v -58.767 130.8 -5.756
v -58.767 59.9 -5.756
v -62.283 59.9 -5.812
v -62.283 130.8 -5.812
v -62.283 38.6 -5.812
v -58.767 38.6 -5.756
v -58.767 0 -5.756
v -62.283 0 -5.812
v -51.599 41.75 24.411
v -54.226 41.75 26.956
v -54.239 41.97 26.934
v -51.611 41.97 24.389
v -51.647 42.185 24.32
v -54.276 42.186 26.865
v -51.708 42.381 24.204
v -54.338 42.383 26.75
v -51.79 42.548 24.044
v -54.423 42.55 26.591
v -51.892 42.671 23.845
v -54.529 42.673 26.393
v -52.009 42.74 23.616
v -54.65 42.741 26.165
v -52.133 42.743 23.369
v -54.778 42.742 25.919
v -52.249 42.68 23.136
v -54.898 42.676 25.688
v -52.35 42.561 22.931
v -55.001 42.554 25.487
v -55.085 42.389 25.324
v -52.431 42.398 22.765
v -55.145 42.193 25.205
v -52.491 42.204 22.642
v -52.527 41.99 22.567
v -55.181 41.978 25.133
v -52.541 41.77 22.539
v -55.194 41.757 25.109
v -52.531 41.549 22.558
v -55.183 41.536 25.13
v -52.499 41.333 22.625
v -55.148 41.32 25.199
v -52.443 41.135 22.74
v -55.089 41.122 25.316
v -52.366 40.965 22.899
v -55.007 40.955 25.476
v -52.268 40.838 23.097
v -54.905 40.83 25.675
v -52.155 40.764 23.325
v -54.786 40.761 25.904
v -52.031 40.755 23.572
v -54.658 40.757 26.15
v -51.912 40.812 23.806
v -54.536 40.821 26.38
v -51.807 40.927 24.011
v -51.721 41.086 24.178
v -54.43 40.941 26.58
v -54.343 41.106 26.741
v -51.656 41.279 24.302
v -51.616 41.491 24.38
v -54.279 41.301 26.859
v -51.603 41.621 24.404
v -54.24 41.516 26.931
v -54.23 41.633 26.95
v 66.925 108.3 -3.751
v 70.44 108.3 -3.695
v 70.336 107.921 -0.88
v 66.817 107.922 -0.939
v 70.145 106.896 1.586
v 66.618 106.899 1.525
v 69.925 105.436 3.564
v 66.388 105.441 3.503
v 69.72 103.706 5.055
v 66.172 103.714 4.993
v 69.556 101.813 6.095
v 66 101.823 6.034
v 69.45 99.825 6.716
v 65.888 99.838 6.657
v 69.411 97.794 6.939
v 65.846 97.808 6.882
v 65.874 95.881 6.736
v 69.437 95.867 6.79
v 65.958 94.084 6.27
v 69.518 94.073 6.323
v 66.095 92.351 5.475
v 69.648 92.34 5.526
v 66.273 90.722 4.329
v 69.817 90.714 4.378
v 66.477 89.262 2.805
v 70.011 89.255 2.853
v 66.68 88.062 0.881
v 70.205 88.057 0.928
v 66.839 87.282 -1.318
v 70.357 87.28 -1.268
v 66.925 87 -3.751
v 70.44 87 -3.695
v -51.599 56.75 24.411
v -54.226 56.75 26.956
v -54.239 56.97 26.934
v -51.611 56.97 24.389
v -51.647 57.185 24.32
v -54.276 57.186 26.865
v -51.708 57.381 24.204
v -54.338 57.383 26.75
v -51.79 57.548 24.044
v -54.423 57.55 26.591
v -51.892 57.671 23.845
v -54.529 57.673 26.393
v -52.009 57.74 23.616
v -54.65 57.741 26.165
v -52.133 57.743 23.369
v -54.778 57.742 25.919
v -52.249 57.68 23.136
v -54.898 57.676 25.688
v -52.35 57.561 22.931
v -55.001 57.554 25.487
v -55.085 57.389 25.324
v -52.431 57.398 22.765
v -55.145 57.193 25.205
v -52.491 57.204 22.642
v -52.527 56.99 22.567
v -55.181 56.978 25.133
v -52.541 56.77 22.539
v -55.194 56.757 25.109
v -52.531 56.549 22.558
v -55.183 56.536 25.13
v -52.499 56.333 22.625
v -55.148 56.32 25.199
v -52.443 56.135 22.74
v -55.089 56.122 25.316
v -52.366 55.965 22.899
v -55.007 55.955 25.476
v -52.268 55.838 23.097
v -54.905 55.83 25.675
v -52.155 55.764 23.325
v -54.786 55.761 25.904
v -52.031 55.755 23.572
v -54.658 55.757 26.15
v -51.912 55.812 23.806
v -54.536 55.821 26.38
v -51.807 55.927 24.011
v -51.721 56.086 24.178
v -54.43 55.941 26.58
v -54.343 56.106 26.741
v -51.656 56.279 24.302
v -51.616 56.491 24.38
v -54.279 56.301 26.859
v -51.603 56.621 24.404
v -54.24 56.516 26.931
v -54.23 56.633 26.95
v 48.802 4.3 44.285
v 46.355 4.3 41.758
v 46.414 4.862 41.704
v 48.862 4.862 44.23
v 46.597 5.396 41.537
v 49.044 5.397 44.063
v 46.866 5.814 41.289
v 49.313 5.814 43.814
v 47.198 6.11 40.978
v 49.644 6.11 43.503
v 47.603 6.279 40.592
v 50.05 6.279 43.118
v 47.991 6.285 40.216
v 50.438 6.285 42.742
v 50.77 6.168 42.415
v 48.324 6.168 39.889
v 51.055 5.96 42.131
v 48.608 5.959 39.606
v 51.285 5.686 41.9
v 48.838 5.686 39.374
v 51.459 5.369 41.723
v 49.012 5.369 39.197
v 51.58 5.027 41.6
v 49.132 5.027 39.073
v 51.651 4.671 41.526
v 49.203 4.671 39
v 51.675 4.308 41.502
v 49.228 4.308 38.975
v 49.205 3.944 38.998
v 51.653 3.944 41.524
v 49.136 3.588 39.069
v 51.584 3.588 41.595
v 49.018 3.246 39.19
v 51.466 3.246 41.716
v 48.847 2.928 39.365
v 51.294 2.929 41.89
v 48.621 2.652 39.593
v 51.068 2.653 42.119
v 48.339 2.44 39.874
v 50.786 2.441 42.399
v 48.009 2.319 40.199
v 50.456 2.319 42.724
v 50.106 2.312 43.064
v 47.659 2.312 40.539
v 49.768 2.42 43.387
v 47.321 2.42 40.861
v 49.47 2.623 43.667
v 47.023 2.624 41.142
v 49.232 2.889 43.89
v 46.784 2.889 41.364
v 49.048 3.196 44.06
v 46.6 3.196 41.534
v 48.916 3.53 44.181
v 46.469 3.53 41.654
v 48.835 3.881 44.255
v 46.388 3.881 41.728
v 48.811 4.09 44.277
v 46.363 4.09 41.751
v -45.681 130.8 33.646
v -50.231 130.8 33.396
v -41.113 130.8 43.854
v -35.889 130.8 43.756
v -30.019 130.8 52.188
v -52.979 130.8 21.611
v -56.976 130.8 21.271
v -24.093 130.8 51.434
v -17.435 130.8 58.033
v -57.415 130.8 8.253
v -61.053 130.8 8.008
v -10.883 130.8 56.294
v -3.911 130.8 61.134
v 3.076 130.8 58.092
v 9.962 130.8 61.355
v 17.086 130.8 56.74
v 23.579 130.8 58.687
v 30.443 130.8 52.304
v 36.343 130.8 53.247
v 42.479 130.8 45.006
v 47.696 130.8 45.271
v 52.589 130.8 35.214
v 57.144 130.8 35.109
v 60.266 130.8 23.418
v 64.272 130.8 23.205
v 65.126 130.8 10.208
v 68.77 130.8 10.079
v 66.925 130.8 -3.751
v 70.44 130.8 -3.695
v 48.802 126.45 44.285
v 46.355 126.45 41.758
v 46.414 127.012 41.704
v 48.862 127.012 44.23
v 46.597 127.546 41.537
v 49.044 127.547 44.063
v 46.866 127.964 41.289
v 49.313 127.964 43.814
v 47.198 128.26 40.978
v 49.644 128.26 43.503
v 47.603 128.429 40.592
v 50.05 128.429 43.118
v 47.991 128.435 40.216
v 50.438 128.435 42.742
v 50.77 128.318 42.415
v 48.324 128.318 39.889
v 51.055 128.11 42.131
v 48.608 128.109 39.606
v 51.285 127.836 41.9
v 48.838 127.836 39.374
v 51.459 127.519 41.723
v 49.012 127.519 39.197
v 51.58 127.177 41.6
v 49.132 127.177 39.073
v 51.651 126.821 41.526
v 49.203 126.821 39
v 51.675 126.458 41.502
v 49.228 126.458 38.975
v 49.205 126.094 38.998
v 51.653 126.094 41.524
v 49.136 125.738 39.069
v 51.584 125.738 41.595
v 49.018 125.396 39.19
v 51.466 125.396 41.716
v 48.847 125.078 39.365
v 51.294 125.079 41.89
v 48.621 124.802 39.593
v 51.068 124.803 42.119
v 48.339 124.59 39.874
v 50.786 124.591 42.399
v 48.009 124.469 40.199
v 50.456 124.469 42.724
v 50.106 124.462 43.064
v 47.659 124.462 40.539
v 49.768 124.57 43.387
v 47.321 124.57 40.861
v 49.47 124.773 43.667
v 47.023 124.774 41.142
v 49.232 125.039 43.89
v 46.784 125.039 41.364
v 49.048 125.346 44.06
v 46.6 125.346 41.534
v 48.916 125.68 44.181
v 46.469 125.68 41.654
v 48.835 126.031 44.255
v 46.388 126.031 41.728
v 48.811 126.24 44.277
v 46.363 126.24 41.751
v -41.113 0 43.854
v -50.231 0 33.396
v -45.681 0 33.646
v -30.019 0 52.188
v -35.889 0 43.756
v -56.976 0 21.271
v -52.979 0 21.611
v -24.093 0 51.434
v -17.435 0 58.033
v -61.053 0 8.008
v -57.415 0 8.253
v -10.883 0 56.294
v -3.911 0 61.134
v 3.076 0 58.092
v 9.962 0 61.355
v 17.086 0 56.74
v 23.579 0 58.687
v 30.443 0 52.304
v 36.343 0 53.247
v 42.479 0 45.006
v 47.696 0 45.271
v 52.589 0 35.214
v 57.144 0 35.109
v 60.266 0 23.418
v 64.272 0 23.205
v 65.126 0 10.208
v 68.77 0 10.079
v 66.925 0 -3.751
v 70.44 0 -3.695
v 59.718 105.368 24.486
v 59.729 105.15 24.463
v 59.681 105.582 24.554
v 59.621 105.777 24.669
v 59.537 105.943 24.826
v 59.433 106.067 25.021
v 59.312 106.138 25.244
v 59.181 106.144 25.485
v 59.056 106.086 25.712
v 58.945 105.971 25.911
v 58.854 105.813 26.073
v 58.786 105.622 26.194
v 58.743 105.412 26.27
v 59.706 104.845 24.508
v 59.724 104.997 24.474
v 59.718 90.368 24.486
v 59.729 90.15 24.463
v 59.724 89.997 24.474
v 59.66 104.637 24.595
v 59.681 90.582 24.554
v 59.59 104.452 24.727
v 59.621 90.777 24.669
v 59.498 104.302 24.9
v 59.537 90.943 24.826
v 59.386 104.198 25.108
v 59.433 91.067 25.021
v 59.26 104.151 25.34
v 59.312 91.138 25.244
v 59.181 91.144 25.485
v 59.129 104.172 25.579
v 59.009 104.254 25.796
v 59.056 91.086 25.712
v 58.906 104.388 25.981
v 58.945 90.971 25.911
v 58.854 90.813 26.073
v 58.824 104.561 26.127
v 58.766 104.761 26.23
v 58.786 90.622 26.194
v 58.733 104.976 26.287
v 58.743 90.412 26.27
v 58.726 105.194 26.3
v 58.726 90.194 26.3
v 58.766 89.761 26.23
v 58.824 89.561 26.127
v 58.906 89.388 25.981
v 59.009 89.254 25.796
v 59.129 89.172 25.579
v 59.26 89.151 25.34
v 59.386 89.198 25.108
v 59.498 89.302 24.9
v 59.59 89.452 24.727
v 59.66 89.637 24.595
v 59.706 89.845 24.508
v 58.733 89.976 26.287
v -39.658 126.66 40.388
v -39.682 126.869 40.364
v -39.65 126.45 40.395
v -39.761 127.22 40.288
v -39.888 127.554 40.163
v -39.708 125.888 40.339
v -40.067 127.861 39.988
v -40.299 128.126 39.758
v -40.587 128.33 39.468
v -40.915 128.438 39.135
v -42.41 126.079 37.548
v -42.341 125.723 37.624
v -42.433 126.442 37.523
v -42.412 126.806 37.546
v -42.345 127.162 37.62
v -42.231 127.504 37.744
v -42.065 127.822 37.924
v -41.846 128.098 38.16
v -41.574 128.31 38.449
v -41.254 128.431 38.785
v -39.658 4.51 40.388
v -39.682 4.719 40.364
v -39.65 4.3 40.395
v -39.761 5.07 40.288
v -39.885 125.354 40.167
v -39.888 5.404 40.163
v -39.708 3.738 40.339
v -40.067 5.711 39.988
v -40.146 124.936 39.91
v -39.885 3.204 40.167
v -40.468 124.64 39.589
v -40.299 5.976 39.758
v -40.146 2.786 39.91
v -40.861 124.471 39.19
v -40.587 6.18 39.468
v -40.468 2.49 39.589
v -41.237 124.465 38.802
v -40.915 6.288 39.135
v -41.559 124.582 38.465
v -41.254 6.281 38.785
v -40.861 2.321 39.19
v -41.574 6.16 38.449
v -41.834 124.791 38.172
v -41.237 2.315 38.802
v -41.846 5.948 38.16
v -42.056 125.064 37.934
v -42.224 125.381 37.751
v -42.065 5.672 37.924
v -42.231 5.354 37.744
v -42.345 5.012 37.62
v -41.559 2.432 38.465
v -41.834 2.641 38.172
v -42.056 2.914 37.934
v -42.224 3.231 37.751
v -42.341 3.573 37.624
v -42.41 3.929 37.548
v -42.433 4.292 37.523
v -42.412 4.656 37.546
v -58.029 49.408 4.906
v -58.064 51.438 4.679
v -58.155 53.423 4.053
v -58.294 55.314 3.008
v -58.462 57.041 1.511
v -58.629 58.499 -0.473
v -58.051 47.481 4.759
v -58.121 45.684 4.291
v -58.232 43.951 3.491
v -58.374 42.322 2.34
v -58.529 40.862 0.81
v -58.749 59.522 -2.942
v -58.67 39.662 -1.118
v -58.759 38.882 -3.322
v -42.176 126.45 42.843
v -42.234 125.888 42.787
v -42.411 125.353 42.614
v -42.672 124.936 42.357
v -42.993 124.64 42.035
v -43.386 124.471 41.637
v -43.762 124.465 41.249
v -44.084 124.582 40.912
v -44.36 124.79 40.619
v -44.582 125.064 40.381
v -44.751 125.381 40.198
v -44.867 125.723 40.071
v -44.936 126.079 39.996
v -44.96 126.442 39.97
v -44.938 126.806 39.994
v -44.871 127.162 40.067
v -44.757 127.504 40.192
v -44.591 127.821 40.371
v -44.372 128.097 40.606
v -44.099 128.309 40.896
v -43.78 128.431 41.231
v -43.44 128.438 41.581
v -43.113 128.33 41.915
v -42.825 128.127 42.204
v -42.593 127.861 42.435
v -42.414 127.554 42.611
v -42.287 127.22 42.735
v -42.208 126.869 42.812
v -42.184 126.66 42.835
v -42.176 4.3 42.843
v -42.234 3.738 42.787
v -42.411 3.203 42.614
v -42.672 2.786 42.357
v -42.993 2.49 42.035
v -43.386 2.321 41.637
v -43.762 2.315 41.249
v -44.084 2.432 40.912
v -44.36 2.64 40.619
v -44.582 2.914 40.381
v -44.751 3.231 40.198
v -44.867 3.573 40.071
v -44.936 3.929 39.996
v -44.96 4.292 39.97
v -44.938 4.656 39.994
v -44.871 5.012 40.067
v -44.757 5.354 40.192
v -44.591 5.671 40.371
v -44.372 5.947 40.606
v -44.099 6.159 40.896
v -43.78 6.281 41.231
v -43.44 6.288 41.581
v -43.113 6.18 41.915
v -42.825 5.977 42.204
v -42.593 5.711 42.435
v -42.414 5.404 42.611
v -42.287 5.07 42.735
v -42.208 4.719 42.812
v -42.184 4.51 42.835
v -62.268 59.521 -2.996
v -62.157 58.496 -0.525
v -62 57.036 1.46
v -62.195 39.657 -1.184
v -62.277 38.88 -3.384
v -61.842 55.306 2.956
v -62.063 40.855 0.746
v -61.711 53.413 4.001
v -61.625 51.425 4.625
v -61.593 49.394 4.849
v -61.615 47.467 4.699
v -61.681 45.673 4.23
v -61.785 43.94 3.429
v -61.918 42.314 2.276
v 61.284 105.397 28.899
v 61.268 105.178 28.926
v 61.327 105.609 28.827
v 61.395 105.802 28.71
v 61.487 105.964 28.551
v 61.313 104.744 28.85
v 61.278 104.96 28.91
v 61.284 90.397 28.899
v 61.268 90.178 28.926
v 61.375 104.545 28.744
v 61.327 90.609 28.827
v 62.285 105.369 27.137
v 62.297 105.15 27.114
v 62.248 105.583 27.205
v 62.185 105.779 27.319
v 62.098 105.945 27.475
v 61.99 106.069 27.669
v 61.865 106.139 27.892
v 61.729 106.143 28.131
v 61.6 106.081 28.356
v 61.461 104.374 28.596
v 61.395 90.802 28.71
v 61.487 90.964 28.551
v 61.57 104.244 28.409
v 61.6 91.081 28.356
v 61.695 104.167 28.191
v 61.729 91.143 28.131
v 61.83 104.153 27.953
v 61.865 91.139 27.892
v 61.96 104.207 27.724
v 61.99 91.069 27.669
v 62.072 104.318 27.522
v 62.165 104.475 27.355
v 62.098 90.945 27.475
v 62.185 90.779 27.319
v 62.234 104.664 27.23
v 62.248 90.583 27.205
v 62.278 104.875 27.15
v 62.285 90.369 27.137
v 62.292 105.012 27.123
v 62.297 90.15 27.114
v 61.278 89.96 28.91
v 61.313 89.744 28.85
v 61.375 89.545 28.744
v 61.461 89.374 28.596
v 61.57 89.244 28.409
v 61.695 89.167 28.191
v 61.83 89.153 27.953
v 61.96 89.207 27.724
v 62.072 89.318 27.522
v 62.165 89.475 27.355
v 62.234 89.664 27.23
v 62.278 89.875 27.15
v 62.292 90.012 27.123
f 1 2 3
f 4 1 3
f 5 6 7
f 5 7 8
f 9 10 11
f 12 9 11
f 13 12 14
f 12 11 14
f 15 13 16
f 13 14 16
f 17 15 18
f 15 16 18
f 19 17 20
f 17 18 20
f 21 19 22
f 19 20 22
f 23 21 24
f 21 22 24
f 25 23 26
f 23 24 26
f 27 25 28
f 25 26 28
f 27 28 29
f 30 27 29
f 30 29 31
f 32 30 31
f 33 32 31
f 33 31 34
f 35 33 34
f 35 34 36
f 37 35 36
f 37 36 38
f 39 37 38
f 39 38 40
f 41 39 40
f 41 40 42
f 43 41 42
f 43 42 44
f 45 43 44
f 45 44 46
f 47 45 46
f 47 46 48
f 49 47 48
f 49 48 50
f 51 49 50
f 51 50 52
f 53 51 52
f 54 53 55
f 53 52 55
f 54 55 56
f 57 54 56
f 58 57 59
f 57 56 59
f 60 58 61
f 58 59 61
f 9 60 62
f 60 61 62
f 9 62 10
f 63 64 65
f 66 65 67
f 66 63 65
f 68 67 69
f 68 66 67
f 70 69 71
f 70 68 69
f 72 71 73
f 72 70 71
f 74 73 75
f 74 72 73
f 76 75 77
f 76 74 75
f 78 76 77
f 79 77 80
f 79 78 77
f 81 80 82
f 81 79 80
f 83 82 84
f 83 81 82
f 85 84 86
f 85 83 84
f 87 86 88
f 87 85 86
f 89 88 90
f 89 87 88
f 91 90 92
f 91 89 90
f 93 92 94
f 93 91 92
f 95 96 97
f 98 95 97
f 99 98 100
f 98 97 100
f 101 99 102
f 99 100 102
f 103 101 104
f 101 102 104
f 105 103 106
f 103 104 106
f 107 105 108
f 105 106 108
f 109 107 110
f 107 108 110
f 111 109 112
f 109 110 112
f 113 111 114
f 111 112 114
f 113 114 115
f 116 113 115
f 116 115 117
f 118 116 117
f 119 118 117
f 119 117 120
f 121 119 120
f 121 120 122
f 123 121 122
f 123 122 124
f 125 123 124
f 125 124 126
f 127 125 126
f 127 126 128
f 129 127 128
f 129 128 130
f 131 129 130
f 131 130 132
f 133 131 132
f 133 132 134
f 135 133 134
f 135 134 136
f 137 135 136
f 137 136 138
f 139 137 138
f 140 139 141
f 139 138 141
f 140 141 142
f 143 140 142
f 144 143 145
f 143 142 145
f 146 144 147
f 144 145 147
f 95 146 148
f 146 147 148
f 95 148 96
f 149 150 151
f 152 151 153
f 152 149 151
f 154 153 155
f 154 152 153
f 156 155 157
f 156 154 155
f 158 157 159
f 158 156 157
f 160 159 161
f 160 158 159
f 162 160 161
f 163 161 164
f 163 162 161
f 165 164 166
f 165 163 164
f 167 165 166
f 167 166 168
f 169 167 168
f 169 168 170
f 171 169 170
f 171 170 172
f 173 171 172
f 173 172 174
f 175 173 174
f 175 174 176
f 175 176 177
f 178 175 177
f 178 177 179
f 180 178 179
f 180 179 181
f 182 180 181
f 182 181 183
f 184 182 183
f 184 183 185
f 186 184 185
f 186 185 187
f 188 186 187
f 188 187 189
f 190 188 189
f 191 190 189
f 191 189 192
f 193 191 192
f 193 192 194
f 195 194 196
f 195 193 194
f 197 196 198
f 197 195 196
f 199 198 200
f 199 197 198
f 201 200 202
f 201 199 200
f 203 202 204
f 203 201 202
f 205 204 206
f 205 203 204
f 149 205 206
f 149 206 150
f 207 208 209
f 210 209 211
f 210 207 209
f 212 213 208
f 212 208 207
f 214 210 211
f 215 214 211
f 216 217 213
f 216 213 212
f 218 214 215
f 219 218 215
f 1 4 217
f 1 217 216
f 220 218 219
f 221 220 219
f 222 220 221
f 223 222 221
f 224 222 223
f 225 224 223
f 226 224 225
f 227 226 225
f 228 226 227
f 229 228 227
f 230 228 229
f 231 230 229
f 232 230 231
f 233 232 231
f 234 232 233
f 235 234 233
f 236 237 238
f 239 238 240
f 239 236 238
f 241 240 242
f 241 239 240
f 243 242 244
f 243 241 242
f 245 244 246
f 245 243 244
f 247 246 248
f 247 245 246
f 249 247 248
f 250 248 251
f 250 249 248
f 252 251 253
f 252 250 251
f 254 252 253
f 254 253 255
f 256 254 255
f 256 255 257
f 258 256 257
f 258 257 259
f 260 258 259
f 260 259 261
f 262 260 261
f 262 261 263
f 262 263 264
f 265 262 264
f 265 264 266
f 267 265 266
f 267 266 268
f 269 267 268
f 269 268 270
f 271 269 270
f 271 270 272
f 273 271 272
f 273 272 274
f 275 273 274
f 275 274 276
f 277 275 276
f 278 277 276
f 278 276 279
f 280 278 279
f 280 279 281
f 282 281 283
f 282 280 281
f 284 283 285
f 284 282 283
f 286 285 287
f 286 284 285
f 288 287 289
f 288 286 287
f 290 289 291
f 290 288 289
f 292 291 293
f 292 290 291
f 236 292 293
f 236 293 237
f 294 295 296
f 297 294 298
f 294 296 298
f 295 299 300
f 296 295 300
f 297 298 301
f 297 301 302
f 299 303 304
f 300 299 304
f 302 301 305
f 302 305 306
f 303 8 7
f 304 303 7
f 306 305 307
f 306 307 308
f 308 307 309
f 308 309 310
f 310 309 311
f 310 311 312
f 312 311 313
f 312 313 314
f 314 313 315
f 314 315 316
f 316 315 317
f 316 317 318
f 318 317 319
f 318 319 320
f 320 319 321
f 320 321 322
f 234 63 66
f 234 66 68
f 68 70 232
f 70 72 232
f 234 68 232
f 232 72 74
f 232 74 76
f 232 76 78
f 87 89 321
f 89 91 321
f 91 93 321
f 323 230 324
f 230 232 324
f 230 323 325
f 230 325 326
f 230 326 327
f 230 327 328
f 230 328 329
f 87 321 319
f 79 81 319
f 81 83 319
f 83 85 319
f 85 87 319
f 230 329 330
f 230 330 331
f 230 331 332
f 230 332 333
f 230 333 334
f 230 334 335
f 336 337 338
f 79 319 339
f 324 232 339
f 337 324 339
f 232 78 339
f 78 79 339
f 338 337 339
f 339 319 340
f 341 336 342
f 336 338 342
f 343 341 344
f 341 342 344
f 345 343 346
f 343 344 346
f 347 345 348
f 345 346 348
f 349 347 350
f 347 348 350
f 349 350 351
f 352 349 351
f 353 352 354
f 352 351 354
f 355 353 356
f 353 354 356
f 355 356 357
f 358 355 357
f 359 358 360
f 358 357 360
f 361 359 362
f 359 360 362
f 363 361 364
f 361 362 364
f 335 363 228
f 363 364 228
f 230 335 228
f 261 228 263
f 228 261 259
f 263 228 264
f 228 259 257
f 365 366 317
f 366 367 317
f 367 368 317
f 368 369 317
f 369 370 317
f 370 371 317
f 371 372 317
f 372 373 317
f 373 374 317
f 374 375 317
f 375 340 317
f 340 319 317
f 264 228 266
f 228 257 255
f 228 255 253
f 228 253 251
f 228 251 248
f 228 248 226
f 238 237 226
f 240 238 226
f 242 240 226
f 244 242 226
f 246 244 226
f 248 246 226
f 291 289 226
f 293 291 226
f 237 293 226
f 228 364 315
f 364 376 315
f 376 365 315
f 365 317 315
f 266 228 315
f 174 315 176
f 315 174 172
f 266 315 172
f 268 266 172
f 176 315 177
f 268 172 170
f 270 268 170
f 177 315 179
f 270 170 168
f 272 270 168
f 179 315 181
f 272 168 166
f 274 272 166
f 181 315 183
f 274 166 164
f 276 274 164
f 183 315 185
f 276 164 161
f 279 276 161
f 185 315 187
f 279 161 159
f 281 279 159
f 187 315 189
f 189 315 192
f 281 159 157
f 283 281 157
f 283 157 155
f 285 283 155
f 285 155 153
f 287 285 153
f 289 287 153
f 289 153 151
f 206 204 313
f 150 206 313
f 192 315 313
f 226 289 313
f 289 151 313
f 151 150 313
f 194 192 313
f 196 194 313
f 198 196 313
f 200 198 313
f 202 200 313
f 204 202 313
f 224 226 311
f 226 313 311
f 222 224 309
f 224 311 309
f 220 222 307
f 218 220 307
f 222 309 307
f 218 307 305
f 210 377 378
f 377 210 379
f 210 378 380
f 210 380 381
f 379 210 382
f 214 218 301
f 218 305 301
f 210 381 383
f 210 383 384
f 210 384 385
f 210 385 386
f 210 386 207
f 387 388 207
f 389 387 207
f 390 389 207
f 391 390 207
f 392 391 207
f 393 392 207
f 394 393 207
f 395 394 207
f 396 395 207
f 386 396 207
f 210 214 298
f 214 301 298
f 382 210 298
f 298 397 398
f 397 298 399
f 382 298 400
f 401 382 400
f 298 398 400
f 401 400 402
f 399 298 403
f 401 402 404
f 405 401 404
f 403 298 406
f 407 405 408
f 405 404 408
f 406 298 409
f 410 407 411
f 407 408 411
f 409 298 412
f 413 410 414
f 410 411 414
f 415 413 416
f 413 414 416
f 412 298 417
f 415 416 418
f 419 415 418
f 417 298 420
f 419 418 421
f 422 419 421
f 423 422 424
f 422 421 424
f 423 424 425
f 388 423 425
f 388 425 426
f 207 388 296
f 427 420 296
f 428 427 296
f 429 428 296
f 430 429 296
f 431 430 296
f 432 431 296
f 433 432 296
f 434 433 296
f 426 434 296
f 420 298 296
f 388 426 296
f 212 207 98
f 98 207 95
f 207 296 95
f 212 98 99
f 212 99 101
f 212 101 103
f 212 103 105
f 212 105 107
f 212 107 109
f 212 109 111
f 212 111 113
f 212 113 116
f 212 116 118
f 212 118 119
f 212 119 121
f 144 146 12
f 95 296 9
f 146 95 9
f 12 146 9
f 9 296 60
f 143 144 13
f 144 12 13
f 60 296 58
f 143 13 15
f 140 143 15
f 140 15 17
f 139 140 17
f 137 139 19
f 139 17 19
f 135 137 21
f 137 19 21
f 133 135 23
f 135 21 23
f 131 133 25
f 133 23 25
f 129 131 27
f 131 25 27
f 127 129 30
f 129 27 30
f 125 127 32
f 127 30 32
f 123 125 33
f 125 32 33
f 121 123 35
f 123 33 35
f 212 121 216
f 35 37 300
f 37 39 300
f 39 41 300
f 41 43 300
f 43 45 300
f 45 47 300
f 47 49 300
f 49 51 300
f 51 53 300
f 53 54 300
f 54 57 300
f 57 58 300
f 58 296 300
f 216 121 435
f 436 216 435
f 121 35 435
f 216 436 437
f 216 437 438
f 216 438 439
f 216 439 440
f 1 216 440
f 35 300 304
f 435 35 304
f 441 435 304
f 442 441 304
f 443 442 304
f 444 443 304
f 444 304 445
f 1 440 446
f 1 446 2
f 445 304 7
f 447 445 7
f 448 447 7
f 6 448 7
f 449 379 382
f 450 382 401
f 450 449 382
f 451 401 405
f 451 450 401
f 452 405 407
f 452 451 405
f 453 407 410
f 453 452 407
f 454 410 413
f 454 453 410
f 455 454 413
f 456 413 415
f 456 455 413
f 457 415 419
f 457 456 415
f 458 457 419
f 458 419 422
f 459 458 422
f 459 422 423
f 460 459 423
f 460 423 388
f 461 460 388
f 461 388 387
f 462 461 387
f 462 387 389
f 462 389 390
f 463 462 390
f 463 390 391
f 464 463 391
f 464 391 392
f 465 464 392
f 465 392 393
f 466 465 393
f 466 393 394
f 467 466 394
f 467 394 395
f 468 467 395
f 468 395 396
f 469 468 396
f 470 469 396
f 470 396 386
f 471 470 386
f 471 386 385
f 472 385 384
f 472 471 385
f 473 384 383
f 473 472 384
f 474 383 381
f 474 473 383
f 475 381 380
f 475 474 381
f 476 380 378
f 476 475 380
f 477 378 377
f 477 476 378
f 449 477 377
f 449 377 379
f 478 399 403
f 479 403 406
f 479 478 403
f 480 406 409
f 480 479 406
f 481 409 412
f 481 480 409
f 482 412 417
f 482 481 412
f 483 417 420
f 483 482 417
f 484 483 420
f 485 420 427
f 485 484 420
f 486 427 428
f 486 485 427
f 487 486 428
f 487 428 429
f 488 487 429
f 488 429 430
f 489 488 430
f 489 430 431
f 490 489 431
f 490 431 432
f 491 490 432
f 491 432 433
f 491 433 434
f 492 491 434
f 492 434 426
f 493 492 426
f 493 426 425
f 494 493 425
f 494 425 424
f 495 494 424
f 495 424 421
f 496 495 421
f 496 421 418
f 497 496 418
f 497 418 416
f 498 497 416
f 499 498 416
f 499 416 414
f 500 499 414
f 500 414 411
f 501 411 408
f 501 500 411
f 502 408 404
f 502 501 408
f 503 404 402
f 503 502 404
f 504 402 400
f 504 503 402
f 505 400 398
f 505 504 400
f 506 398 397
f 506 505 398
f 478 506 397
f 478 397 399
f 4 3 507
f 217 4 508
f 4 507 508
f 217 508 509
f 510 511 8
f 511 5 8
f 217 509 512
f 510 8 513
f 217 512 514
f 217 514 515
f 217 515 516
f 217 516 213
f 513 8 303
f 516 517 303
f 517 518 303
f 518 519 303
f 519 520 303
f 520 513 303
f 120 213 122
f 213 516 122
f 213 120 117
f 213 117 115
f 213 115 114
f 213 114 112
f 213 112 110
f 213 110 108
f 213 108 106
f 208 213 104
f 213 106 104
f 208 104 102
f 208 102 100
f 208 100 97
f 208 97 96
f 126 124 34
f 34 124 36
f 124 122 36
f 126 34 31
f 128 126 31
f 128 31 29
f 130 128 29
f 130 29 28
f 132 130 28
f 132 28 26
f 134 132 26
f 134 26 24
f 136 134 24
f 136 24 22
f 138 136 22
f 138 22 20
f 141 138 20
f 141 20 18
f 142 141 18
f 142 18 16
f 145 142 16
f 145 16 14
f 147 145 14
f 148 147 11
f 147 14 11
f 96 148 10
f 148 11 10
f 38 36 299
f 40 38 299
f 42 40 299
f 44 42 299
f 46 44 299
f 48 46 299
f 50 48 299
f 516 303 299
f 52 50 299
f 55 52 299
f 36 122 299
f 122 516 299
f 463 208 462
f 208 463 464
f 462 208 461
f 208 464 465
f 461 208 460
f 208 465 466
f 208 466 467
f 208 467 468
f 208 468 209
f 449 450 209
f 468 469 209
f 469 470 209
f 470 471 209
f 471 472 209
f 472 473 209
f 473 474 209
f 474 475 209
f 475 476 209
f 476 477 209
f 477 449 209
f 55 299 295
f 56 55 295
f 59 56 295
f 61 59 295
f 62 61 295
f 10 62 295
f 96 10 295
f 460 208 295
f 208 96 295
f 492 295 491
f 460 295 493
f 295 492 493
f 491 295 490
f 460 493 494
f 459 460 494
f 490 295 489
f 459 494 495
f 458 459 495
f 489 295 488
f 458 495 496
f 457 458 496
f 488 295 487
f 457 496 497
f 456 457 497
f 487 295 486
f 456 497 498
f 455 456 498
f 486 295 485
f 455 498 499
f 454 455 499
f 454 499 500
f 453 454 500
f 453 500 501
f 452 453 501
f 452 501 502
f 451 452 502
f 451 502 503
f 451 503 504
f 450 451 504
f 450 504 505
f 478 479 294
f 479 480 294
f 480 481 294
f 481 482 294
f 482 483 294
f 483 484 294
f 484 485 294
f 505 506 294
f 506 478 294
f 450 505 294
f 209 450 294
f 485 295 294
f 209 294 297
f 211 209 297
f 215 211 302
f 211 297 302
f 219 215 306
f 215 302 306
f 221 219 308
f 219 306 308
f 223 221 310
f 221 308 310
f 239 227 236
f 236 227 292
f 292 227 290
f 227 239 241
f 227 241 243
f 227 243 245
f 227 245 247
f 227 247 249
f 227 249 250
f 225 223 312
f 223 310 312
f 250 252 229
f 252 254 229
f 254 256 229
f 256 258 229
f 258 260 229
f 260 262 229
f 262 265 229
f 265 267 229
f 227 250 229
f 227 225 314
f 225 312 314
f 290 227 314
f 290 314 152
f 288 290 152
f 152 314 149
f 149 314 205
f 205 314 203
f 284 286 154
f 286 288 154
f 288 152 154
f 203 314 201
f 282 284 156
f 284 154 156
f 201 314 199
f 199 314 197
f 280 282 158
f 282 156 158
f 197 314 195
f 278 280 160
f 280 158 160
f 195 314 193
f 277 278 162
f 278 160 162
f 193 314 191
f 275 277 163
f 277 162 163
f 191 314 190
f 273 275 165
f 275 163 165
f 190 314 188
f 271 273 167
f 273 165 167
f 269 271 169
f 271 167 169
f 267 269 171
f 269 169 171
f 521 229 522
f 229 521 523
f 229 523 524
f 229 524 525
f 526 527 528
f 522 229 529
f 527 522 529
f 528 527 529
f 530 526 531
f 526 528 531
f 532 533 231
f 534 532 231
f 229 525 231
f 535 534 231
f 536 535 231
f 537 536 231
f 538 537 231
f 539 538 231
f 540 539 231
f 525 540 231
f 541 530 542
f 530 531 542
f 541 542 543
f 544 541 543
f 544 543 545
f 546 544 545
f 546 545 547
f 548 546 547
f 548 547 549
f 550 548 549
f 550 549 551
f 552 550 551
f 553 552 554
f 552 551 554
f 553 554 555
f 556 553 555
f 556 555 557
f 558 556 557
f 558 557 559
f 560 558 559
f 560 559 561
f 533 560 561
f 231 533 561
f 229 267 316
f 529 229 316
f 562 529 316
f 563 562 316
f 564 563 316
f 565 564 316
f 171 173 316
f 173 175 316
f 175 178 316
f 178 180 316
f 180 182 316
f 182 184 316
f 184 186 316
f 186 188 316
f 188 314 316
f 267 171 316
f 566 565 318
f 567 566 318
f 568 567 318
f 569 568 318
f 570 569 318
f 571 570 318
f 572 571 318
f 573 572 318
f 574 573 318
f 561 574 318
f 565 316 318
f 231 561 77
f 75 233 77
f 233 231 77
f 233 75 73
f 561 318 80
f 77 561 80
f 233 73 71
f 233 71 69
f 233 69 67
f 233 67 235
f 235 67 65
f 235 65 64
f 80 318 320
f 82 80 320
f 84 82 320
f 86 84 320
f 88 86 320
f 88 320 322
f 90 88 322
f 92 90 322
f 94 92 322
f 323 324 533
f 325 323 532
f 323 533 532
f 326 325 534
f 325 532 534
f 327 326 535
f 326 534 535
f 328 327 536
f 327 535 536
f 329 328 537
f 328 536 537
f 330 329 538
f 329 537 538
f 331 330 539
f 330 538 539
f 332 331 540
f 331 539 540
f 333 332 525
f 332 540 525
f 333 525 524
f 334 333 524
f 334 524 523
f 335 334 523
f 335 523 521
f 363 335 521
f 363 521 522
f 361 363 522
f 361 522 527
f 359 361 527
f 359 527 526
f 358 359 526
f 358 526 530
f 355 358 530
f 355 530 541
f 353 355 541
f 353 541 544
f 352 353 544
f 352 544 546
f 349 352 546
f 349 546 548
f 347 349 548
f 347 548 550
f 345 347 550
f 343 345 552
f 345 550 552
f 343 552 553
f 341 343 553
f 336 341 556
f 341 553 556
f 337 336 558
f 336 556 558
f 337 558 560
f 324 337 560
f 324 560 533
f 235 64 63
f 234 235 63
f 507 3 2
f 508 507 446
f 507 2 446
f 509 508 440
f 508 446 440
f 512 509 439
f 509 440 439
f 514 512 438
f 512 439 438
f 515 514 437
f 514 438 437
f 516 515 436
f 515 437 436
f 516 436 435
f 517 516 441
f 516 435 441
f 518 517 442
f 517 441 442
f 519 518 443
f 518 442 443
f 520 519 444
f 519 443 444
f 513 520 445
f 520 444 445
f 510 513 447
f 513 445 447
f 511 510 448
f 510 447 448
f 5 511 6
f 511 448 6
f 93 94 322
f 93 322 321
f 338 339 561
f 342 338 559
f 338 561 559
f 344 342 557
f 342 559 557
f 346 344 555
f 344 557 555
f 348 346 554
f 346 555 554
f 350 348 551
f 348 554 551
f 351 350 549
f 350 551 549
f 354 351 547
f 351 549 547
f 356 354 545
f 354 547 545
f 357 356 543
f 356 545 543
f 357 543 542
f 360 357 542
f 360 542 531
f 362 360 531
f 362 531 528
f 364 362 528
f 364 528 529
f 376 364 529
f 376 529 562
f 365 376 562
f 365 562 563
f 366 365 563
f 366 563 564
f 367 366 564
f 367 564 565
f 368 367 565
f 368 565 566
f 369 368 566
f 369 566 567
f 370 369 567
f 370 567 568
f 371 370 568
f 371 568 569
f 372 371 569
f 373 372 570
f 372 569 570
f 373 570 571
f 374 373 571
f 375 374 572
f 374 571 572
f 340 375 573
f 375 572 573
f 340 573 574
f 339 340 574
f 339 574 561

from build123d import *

# Parameters (mm, degrees)
BOSS_EXTRUDE1_DEPTH     = 130.8
SKETCH34_R              = 10.65
CUT_EXTRUDE2_DEPTH      = 157.940740259
SKETCH35_R              = 10.65
CUT_EXTRUDE3_DEPTH      = 157.940740428
CUT_EXTRUDE8_DEPTH      = 132.768470688
CUT_EXTRUDE8_DEPTH_BACK = 132.768470688
SKETCH40_R              = 2
CUT_EXTRUDE9_DEPTH      = 136.886547659
CUT_EXTRUDE9_DEPTH_BACK = 136.886547659
SKETCH41_R              = 2.000000001
SKETCH42_R              = 1
CUT_EXTRUDE10_DEPTH     = 159.175431949
SKETCH43_R              = 1
CUT_EXTRUDE11_DEPTH     = 158.012751408


with BuildPart() as part:
    # Sketch1 → Boss-Extrude1 (new body)
    with BuildSketch(Plane(origin=(0, 0, 0), x_dir=(0.999872775920664, 0, 0.01595092388251422), z_dir=(0, 1, 0))):
        with BuildLine():
            Line((70.372282363, 4.818066557), (66.856282363, 4.818066557))
            ThreePointArc((66.856282363, 4.818066557), (4.002282363, -58.035933443), (-58.851717637, 4.818066557))
            Line((-58.851717637, 4.818066557), (-62.367717637, 4.818066557))
            ThreePointArc((-62.367717637, 4.818066557), (4.002282363, -61.551933443), (70.372282363, 4.818066557))
        make_face()
    extrude(amount=BOSS_EXTRUDE1_DEPTH)

    # Sketch34 → Cut-Extrude2 (cut, through all)
    with BuildSketch(Plane(origin=(4.409550098, 18.583358198, -25.497377904), x_dir=(0.01595092388251443, 0, -0.9998727759206639), z_dir=(0.9998727759206639, 0, 0.01595092388251443))):
        with Locations((-20.746403865, 79.066641802)):
            Circle(SKETCH34_R)
    extrude(amount=CUT_EXTRUDE2_DEPTH, mode=Mode.SUBTRACT)

    # Sketch35 → Cut-Extrude3 (cut, through all)
    with BuildSketch(Plane(origin=(4.409550098, 18.583358198, -25.497377904), x_dir=(0.01595092388251443, 0, -0.9998727759206639), z_dir=(0.9998727759206639, 0, 0.01595092388251443))):
        with Locations((-20.746403865, 30.666641802)):
            Circle(SKETCH35_R)
    extrude(amount=-CUT_EXTRUDE3_DEPTH, mode=Mode.SUBTRACT)

    # Sketch40 → Cut-Extrude8 (cut, two sides: drawn at the far end of the back side and taken through both)
    with BuildSketch(Plane(origin=(3.677708785, 38.899932993, -5.167441514), x_dir=(-0.6958141043149662, 0, -0.7182219240850014), z_dir=(0.7182219240850014, 0, -0.6958141043149662)).offset(-CUT_EXTRUDE8_DEPTH_BACK)):
        with Locations(Location((-0.576184071, 87.550067007, 0), (0, 0, 180))):
            Circle(SKETCH40_R)
        with Locations(Location((-0.576184071, -34.599932993, 0), (0, 0, 180))):
            Circle(SKETCH40_R)
    extrude(amount=CUT_EXTRUDE8_DEPTH + CUT_EXTRUDE8_DEPTH_BACK, mode=Mode.SUBTRACT)

    # Sketch41 → Cut-Extrude9 (cut, two sides: drawn at the far end of the back side and taken through both)
    with BuildSketch(Plane(origin=(8.558168581, 38.899932993, -9.093398931), x_dir=(-0.7182219240850014, 0, 0.6958141043149662), z_dir=(-0.6958141043149662, 0, -0.7182219240850014)).offset(-CUT_EXTRUDE9_DEPTH_BACK)):
        with Locations((6.236989769, 87.550067007)):
            Circle(SKETCH41_R)
        with Locations((6.236989769, -34.599932997)):
            Circle(SKETCH41_R)
    extrude(amount=CUT_EXTRUDE9_DEPTH + CUT_EXTRUDE9_DEPTH_BACK, mode=Mode.SUBTRACT)

    # Sketch42 → Cut-Extrude10 (cut, through all)
    with BuildSketch(Plane(origin=(57.474877903, 38.899932993, 41.409432257), x_dir=(0.7182958266208218, 0, -0.6957378137338163), z_dir=(0.6957378137338163, 0, 0.7182958266208218))):
        with Locations((12.409477286, 66.250067007)):
            Circle(SKETCH42_R)
        with Locations((12.409477286, 51.250067007)):
            Circle(SKETCH42_R)
    extrude(amount=-CUT_EXTRUDE10_DEPTH, mode=Mode.SUBTRACT)

    # Sketch43 → Cut-Extrude11 (cut, through all)
    with BuildSketch(Plane(origin=(-46.82502092, 38.899932993, 43.748332437), x_dir=(0.6957378137338114, 0, 0.7182958266208266), z_dir=(-0.7182958266208266, 0, 0.6957378137338114))):
        with Locations((-18.211184322, 17.850067007)):
            Circle(SKETCH43_R)
        with Locations((-18.211184322, 2.850067007)):
            Circle(SKETCH43_R)
    extrude(amount=-CUT_EXTRUDE11_DEPTH, mode=Mode.SUBTRACT)


solid = part.part
